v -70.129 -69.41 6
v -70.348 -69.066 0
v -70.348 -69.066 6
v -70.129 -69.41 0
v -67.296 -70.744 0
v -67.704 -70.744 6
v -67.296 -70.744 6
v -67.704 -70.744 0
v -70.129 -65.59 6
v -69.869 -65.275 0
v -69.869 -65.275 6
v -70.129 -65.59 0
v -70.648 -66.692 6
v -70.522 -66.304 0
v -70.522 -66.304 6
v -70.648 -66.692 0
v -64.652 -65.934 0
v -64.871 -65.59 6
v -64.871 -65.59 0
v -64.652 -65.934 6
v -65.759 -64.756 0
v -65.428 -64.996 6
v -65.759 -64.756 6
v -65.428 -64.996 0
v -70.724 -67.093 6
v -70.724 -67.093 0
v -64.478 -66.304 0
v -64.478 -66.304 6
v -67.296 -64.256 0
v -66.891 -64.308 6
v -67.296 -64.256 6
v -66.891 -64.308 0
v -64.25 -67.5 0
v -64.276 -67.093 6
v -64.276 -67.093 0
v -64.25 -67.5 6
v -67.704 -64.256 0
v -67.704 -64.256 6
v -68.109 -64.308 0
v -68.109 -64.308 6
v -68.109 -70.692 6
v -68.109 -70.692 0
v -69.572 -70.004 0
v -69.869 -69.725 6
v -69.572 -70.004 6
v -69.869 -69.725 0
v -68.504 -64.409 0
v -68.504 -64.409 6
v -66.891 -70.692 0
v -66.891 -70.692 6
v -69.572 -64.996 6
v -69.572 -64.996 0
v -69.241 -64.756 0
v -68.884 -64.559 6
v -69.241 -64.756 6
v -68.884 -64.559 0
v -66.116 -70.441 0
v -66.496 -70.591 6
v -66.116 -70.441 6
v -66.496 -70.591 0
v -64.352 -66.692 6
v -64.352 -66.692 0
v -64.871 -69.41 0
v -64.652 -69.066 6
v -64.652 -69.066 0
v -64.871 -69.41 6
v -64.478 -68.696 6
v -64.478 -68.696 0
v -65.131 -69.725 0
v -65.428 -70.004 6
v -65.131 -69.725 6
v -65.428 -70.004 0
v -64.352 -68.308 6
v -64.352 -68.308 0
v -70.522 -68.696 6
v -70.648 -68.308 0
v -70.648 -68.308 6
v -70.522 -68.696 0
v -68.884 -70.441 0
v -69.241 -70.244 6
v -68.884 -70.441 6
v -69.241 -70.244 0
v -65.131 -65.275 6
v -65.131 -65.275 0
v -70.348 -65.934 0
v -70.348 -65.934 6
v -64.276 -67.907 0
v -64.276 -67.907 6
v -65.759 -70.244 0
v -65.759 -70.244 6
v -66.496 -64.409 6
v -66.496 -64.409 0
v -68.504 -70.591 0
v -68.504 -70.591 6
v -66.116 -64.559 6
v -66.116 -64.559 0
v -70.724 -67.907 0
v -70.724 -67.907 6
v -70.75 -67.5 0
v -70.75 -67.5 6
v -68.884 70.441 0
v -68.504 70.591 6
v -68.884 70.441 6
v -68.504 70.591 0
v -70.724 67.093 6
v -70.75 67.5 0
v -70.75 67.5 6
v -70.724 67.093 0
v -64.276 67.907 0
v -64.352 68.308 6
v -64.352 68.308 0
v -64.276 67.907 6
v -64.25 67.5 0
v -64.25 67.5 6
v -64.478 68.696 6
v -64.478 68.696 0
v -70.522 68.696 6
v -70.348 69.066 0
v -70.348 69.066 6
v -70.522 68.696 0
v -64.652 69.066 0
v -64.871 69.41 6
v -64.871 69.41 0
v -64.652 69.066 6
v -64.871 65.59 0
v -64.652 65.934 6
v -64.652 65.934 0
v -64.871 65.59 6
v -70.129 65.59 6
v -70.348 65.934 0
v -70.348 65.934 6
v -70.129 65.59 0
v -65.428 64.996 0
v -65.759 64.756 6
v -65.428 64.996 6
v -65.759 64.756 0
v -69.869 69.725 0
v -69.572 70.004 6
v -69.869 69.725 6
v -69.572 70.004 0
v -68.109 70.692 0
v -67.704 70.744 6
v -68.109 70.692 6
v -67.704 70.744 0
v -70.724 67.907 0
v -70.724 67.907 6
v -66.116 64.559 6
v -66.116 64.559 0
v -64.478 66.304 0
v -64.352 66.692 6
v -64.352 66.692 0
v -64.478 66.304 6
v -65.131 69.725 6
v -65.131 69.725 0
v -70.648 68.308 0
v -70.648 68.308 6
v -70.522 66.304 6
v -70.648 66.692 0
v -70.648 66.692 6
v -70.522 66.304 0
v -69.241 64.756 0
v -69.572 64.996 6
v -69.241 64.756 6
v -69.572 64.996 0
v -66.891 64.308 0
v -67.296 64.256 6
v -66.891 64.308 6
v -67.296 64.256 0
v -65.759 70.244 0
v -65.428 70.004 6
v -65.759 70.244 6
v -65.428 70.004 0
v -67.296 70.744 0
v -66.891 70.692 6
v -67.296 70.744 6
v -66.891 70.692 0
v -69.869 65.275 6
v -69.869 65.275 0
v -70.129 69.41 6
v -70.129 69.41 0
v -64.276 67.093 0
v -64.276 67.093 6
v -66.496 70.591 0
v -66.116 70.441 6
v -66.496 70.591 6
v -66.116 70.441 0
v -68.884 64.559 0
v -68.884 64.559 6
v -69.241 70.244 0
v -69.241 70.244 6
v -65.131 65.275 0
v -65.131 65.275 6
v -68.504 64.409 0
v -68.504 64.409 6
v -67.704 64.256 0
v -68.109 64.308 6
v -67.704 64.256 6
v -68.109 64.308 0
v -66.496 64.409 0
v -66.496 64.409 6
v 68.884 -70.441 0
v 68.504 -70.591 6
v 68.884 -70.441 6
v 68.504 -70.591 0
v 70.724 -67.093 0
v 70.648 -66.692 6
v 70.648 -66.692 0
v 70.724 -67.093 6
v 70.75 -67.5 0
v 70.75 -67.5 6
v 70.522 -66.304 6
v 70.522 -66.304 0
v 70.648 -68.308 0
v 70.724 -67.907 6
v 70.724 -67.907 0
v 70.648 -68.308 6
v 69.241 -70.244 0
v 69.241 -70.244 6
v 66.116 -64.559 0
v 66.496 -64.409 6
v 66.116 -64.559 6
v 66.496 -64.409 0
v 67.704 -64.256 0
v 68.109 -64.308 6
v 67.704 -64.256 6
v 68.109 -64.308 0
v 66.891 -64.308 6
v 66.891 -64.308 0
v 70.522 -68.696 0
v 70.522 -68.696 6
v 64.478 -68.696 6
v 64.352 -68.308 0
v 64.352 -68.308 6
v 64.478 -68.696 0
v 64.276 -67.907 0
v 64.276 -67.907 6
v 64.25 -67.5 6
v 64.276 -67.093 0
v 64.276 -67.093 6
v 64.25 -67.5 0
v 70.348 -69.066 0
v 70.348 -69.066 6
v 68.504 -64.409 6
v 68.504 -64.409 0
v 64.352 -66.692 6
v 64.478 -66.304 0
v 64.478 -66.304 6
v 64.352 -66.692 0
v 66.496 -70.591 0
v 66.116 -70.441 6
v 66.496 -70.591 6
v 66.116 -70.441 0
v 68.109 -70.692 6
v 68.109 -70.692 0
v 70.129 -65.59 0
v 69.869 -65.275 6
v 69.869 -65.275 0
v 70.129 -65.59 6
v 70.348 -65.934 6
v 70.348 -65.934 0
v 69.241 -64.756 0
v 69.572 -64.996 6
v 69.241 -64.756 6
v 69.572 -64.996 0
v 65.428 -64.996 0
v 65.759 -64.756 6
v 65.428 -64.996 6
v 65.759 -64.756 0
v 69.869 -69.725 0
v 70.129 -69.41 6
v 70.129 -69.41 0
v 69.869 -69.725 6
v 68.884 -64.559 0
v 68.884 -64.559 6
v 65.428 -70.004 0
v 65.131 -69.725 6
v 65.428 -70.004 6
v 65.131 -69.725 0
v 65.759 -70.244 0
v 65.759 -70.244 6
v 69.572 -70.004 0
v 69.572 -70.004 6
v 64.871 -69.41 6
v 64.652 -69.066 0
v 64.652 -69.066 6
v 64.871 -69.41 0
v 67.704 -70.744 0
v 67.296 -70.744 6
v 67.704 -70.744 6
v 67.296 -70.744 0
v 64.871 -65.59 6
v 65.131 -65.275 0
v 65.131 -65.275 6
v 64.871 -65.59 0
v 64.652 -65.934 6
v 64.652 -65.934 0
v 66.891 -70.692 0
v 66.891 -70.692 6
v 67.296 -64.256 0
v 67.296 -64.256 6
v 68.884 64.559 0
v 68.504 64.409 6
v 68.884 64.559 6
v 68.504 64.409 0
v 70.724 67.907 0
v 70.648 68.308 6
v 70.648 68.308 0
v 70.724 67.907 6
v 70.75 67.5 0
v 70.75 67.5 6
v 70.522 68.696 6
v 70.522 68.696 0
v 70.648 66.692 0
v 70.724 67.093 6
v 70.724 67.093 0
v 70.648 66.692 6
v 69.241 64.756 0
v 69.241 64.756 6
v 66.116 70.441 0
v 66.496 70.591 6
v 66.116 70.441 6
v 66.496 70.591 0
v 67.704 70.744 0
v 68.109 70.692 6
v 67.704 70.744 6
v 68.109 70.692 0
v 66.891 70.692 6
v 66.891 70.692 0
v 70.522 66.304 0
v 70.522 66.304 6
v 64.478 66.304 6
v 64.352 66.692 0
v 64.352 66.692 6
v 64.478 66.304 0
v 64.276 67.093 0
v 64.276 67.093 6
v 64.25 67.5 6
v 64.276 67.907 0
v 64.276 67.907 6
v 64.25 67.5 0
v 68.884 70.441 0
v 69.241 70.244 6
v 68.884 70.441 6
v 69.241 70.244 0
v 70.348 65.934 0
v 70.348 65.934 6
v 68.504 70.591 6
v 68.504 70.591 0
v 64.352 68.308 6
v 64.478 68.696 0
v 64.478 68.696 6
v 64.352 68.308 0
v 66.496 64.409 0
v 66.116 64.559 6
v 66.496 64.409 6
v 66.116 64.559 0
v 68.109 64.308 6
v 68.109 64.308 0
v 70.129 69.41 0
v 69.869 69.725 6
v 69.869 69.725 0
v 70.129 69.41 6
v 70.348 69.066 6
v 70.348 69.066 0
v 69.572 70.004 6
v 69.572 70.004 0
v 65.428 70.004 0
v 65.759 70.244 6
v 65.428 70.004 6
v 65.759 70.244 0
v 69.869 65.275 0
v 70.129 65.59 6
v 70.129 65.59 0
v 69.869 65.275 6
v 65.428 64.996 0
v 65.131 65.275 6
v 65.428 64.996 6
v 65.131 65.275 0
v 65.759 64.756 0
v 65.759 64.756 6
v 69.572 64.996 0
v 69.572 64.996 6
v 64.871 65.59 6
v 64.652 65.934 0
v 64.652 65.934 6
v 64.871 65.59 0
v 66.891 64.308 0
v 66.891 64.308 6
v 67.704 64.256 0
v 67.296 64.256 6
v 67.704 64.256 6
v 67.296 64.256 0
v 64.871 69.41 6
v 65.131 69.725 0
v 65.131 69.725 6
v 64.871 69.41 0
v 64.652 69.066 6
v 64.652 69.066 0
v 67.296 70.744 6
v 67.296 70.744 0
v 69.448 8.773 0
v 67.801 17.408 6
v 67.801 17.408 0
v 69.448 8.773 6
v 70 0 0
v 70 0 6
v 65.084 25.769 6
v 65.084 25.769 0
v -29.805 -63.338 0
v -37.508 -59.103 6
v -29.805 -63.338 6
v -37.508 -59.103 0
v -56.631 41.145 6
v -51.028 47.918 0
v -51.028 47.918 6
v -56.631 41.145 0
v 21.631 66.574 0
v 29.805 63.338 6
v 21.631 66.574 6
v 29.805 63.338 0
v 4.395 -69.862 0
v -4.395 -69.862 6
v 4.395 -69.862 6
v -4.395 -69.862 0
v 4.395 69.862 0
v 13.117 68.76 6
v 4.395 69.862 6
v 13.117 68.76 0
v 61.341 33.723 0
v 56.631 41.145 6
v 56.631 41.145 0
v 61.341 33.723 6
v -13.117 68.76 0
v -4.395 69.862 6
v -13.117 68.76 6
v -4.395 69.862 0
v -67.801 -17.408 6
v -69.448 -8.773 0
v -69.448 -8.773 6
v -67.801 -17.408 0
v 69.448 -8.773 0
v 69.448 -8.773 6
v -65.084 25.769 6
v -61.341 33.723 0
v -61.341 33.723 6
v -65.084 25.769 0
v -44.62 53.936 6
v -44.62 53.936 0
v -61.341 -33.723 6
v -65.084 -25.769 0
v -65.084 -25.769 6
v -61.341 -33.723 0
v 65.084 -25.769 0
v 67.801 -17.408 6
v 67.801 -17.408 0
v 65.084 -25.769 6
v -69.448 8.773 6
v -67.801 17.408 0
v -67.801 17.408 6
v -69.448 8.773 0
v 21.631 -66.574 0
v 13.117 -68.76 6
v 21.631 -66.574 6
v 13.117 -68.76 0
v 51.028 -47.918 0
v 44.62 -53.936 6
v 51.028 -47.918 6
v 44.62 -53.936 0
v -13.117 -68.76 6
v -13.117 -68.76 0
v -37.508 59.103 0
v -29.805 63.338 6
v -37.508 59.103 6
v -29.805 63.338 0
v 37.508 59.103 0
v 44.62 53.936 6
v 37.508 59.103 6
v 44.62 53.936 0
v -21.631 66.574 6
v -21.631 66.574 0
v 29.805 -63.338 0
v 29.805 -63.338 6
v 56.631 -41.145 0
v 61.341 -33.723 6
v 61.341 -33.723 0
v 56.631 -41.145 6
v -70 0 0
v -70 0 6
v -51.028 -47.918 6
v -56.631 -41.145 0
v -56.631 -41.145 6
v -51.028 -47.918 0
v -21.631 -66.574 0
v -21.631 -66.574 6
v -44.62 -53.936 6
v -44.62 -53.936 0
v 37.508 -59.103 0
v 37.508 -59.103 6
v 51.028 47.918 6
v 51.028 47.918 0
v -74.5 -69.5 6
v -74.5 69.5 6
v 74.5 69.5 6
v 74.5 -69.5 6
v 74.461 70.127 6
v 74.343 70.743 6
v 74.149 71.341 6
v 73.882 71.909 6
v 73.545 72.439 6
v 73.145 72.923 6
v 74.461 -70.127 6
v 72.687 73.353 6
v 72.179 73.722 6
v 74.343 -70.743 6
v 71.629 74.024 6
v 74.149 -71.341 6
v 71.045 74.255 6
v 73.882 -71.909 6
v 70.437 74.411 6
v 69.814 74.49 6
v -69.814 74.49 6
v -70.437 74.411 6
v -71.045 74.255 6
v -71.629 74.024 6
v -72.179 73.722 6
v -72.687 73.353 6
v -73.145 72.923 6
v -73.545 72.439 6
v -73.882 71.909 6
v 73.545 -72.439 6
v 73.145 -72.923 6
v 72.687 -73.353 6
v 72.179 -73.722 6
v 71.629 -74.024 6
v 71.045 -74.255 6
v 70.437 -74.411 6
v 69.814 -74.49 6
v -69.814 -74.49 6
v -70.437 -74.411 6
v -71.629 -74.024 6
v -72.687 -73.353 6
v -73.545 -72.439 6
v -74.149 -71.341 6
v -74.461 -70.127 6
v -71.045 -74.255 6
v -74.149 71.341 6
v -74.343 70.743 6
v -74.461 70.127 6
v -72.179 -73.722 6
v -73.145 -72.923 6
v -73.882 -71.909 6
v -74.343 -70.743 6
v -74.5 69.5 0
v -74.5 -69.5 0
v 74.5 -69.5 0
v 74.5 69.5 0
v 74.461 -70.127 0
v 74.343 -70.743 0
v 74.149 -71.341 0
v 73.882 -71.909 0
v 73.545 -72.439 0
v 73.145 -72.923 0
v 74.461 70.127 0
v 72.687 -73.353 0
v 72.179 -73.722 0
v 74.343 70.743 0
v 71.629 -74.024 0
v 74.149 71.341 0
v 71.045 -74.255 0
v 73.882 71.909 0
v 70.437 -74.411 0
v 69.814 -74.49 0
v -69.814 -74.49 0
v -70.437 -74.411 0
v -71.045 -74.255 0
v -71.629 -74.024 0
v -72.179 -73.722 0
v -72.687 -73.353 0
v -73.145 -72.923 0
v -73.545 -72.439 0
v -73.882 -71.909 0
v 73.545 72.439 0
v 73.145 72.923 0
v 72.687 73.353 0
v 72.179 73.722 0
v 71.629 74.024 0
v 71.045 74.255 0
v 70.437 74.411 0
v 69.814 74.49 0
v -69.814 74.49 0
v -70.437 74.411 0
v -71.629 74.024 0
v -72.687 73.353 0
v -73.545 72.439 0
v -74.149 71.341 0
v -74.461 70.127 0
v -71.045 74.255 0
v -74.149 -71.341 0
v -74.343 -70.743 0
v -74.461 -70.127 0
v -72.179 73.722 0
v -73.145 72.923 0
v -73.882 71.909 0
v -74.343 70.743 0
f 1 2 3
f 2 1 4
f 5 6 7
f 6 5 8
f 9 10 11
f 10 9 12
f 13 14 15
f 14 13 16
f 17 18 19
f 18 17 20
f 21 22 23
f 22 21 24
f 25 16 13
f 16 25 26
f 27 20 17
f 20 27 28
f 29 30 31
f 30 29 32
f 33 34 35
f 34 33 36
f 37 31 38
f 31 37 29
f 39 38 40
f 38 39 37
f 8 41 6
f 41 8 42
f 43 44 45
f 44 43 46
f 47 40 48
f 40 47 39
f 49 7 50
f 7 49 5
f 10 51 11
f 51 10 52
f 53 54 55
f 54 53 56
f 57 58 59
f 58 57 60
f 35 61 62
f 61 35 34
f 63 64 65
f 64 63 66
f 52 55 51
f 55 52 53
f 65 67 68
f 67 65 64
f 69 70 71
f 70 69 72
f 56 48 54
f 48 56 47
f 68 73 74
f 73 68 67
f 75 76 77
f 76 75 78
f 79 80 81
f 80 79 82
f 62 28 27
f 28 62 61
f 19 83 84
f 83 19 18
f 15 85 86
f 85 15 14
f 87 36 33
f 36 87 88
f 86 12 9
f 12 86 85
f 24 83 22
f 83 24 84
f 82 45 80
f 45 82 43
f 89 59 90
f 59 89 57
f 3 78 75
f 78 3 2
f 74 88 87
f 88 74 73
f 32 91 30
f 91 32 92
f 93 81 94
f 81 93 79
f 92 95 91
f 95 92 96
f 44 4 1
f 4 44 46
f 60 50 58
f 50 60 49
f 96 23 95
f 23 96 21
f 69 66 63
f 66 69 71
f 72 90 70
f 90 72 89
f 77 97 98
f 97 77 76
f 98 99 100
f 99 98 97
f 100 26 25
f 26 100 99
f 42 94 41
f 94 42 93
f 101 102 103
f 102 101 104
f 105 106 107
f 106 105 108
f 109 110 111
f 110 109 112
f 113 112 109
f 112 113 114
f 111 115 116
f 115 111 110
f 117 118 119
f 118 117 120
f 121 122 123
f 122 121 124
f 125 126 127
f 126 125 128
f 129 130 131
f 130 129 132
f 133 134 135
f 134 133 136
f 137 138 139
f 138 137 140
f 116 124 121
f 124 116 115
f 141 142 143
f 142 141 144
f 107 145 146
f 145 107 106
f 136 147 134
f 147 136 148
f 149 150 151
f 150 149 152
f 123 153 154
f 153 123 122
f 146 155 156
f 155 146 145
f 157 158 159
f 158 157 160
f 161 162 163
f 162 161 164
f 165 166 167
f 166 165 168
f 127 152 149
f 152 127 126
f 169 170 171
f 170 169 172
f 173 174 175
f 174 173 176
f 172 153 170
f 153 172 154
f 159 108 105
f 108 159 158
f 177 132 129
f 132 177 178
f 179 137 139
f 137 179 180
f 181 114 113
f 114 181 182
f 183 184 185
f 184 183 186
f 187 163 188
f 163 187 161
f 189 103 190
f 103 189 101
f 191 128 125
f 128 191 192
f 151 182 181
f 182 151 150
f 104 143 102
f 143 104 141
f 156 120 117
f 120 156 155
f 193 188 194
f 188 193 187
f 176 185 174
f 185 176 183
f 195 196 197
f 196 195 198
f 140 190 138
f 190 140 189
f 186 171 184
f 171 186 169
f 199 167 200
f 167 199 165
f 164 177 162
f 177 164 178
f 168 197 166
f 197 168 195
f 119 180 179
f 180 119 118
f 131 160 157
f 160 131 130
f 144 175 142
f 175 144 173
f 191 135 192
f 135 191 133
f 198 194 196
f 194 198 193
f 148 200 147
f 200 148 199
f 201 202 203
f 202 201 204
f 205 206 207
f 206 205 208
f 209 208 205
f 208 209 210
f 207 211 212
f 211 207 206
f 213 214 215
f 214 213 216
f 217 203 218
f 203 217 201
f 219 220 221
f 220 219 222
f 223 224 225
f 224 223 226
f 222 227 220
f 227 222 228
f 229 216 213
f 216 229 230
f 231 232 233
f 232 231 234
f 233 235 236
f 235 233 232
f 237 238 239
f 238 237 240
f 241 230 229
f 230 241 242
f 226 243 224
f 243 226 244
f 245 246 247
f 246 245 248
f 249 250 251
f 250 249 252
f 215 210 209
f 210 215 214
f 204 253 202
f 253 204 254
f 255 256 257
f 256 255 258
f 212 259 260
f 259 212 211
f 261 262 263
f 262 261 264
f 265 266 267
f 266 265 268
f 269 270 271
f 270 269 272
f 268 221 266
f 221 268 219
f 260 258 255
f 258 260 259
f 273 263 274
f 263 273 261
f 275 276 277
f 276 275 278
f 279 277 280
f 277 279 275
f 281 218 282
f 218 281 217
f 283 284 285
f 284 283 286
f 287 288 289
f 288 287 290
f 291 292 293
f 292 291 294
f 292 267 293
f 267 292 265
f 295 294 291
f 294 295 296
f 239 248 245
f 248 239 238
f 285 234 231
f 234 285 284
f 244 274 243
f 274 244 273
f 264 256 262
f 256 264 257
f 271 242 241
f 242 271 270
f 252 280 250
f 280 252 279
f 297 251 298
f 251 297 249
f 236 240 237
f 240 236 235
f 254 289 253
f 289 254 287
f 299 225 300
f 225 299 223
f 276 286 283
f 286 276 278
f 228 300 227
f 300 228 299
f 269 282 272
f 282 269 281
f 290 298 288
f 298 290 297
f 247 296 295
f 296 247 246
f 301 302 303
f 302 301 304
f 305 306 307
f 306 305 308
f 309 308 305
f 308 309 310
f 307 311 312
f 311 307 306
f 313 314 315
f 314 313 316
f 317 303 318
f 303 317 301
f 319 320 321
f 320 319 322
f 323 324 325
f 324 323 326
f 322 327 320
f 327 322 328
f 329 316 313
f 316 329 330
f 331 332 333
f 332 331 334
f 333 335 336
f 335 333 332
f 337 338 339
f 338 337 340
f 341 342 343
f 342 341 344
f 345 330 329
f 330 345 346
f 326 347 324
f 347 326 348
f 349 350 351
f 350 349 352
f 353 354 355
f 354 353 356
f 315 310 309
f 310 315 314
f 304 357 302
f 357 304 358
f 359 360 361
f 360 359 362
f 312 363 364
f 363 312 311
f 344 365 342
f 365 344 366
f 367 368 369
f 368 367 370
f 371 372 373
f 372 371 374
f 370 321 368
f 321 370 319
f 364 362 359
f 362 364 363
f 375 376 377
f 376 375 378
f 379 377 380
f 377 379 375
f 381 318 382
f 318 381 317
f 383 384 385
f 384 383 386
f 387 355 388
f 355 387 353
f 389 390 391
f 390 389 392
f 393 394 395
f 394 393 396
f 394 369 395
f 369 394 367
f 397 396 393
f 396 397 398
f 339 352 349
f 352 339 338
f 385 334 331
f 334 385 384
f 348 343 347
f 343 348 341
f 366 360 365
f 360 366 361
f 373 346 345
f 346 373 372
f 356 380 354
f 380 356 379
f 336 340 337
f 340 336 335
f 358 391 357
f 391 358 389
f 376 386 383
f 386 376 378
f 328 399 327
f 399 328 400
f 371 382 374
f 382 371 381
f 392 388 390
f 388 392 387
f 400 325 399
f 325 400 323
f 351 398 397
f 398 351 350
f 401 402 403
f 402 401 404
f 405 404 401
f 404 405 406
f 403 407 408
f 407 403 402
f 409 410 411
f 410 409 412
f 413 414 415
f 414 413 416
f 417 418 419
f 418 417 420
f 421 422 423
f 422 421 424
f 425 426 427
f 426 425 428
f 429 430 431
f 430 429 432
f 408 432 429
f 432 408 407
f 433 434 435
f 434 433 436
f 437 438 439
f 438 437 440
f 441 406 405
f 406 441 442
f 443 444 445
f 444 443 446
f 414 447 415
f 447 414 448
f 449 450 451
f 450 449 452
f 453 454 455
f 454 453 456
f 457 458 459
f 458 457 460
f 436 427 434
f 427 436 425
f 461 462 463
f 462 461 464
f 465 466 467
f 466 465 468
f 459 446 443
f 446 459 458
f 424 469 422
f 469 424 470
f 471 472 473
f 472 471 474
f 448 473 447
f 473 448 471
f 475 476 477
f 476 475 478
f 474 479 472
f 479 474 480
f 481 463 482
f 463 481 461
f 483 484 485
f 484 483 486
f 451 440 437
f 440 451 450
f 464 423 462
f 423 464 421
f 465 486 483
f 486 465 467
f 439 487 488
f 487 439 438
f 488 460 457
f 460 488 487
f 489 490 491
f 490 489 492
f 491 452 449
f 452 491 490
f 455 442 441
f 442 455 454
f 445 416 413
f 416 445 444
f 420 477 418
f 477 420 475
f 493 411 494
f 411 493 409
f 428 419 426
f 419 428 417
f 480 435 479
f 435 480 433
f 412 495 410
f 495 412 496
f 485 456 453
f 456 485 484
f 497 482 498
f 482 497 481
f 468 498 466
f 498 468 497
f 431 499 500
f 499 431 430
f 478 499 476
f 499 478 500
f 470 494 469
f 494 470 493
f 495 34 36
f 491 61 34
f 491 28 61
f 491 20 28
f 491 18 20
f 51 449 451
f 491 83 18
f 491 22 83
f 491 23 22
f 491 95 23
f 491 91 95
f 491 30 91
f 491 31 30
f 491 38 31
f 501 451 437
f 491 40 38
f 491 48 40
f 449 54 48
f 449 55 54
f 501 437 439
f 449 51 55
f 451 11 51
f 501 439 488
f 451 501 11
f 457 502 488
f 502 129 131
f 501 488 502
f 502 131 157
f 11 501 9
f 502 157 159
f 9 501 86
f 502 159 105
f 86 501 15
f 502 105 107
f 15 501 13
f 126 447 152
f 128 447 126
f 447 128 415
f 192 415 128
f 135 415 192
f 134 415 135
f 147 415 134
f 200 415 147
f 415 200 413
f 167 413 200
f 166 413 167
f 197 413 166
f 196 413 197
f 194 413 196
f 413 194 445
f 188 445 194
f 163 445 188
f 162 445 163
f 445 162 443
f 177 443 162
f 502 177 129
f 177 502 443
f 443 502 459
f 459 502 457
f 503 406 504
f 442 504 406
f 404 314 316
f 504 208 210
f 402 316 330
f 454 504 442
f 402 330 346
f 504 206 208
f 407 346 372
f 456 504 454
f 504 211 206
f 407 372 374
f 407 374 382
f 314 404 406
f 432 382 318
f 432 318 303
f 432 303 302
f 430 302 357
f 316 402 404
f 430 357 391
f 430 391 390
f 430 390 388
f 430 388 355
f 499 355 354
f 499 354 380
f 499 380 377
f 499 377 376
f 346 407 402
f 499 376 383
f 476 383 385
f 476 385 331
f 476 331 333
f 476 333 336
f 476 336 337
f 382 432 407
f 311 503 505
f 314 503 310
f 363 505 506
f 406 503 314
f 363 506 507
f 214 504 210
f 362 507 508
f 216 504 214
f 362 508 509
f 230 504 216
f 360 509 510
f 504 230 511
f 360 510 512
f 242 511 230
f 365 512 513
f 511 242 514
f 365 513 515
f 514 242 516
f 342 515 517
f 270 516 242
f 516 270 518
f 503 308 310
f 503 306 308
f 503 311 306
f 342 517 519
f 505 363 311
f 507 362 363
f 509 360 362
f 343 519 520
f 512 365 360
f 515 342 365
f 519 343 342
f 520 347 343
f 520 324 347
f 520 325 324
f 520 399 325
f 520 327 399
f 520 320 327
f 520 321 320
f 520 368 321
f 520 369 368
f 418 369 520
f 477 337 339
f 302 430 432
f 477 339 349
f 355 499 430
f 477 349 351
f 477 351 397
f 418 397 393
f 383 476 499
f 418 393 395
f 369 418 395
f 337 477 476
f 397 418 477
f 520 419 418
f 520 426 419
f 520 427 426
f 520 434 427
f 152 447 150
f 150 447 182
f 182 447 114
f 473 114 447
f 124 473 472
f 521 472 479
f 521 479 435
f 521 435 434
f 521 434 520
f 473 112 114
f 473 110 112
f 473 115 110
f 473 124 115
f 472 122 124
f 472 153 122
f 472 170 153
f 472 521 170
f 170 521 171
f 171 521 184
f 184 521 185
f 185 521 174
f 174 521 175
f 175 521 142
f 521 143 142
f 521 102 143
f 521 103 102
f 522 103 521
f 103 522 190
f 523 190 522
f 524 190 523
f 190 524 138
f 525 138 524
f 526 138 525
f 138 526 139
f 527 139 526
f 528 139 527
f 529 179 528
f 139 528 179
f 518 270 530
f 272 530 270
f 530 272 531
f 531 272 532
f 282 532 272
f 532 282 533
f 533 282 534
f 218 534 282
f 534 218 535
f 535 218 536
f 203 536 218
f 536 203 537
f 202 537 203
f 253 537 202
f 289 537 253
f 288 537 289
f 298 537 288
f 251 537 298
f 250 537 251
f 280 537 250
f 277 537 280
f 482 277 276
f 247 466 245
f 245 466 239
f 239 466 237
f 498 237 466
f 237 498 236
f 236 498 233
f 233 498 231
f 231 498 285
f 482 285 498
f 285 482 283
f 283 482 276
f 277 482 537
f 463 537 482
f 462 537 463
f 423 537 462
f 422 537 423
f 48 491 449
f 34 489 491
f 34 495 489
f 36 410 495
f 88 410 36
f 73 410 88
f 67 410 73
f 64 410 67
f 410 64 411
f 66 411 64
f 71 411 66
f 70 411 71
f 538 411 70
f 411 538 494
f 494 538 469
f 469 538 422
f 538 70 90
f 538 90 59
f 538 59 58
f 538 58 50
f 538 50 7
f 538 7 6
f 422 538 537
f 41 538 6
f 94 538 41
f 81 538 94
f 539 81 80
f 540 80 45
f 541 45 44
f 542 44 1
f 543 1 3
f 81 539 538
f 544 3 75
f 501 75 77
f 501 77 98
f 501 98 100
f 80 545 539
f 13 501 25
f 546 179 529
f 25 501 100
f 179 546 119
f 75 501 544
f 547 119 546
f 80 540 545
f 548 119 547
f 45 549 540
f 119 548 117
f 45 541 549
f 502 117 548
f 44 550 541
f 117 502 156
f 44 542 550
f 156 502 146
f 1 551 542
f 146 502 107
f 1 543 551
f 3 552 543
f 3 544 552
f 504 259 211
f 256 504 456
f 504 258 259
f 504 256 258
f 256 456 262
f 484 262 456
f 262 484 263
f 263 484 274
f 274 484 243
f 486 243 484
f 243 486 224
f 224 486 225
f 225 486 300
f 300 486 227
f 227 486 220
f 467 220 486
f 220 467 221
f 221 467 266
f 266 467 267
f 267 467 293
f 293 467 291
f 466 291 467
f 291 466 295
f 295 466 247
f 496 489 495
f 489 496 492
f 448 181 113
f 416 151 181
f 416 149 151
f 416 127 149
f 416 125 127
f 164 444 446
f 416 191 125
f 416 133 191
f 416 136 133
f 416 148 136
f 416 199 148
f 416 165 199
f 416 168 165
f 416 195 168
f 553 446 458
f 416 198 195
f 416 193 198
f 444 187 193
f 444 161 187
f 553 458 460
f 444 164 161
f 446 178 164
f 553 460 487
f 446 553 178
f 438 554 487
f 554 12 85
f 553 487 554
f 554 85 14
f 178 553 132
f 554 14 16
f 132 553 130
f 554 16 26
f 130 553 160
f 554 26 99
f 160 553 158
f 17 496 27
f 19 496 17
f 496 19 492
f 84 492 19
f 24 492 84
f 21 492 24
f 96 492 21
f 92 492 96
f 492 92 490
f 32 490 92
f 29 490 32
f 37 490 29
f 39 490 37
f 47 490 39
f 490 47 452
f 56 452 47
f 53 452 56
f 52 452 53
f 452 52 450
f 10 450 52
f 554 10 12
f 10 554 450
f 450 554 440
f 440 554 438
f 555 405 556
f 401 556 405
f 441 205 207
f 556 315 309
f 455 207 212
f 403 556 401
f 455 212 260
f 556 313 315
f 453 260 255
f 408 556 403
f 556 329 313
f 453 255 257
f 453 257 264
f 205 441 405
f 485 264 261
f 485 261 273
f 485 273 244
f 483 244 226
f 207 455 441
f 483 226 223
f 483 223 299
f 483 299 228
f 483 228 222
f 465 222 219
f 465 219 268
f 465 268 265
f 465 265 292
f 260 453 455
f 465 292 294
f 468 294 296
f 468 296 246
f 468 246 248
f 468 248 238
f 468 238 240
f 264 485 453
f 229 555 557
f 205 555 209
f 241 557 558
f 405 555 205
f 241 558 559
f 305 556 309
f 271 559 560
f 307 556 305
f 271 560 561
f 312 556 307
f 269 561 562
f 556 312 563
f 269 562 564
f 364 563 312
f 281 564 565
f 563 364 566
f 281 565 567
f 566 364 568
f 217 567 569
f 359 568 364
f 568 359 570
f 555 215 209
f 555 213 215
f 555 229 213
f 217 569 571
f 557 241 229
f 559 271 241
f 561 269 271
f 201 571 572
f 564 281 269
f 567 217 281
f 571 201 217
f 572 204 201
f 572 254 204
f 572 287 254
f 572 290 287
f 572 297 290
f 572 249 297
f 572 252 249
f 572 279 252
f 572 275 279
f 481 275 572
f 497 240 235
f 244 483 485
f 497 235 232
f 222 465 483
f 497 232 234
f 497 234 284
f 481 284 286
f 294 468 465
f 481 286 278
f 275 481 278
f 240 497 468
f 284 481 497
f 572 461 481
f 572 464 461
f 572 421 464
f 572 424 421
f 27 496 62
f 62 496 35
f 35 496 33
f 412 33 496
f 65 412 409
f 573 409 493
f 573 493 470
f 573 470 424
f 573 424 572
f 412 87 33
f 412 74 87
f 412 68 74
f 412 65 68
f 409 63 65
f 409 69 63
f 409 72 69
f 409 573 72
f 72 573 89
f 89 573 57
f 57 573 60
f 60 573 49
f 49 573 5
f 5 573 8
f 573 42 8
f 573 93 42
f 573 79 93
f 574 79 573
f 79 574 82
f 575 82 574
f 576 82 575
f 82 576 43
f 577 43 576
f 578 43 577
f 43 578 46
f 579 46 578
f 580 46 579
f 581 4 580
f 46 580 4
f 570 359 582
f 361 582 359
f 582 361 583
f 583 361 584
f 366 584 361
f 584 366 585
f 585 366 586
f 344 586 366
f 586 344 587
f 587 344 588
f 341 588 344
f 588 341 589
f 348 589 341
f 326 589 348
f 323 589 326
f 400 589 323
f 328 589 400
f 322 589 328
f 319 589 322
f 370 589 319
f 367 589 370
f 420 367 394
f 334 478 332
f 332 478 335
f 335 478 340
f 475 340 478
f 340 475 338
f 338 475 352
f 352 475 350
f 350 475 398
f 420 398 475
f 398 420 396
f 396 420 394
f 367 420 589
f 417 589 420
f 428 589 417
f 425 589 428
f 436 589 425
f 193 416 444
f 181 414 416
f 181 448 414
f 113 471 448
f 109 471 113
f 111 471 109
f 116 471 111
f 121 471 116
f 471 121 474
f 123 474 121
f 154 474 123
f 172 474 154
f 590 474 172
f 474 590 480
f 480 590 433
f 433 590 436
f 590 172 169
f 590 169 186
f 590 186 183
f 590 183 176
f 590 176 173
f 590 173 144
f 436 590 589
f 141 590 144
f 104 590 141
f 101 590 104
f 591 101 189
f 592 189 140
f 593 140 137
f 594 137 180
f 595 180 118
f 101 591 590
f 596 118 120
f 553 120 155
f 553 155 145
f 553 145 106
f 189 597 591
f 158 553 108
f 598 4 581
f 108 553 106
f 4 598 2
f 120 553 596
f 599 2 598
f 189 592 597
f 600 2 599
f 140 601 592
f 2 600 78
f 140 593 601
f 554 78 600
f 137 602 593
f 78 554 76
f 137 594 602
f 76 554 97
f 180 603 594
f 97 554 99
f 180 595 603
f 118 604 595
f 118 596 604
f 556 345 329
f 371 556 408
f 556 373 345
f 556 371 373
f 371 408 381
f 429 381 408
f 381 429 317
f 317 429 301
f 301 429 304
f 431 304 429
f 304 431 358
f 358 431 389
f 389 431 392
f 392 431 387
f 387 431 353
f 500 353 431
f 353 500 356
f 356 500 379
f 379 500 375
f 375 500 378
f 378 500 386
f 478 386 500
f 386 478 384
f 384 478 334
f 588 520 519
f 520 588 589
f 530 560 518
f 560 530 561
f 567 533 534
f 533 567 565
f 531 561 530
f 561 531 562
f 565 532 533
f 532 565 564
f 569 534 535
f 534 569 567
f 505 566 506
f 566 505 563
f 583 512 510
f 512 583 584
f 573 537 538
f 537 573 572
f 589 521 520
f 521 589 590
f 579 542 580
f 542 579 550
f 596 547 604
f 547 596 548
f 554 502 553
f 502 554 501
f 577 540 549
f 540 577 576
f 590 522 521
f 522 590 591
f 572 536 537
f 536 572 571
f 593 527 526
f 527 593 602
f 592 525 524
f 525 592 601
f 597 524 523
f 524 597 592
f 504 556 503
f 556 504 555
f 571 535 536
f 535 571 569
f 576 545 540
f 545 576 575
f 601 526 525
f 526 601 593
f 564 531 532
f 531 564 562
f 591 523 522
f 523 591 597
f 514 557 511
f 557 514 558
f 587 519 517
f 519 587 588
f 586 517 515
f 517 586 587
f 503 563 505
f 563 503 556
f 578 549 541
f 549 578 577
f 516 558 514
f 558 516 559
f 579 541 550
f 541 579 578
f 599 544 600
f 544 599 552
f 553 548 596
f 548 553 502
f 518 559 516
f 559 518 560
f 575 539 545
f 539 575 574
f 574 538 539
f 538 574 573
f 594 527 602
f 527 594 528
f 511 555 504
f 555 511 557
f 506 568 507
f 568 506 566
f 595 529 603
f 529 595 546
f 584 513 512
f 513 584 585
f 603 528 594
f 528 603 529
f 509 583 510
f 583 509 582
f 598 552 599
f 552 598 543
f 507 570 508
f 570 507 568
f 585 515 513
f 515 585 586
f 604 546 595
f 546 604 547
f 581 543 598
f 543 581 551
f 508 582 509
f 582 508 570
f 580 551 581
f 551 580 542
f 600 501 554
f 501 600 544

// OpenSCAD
$fn = 50;


difference() {
	union() {
		hull() {
			translate(v = [-69.5000000000, 69.5000000000, 0]) {
				cylinder(h = 6, r = 5);
			}
			translate(v = [69.5000000000, 69.5000000000, 0]) {
				cylinder(h = 6, r = 5);
			}
			translate(v = [-69.5000000000, -69.5000000000, 0]) {
				cylinder(h = 6, r = 5);
			}
			translate(v = [69.5000000000, -69.5000000000, 0]) {
				cylinder(h = 6, r = 5);
			}
		}
	}
	union() {
		#translate(v = [-67.5000000000, -67.5000000000, -100.0000000000]) {
			cylinder(h = 200, r = 3.2500000000);
		}
		#translate(v = [-67.5000000000, 67.5000000000, -100.0000000000]) {
			cylinder(h = 200, r = 3.2500000000);
		}
		#translate(v = [67.5000000000, -67.5000000000, -100.0000000000]) {
			cylinder(h = 200, r = 3.2500000000);
		}
		#translate(v = [67.5000000000, 67.5000000000, -100.0000000000]) {
			cylinder(h = 200, r = 3.2500000000);
		}
		#cylinder(h = 6, r = 70.0000000000);
	}
}
